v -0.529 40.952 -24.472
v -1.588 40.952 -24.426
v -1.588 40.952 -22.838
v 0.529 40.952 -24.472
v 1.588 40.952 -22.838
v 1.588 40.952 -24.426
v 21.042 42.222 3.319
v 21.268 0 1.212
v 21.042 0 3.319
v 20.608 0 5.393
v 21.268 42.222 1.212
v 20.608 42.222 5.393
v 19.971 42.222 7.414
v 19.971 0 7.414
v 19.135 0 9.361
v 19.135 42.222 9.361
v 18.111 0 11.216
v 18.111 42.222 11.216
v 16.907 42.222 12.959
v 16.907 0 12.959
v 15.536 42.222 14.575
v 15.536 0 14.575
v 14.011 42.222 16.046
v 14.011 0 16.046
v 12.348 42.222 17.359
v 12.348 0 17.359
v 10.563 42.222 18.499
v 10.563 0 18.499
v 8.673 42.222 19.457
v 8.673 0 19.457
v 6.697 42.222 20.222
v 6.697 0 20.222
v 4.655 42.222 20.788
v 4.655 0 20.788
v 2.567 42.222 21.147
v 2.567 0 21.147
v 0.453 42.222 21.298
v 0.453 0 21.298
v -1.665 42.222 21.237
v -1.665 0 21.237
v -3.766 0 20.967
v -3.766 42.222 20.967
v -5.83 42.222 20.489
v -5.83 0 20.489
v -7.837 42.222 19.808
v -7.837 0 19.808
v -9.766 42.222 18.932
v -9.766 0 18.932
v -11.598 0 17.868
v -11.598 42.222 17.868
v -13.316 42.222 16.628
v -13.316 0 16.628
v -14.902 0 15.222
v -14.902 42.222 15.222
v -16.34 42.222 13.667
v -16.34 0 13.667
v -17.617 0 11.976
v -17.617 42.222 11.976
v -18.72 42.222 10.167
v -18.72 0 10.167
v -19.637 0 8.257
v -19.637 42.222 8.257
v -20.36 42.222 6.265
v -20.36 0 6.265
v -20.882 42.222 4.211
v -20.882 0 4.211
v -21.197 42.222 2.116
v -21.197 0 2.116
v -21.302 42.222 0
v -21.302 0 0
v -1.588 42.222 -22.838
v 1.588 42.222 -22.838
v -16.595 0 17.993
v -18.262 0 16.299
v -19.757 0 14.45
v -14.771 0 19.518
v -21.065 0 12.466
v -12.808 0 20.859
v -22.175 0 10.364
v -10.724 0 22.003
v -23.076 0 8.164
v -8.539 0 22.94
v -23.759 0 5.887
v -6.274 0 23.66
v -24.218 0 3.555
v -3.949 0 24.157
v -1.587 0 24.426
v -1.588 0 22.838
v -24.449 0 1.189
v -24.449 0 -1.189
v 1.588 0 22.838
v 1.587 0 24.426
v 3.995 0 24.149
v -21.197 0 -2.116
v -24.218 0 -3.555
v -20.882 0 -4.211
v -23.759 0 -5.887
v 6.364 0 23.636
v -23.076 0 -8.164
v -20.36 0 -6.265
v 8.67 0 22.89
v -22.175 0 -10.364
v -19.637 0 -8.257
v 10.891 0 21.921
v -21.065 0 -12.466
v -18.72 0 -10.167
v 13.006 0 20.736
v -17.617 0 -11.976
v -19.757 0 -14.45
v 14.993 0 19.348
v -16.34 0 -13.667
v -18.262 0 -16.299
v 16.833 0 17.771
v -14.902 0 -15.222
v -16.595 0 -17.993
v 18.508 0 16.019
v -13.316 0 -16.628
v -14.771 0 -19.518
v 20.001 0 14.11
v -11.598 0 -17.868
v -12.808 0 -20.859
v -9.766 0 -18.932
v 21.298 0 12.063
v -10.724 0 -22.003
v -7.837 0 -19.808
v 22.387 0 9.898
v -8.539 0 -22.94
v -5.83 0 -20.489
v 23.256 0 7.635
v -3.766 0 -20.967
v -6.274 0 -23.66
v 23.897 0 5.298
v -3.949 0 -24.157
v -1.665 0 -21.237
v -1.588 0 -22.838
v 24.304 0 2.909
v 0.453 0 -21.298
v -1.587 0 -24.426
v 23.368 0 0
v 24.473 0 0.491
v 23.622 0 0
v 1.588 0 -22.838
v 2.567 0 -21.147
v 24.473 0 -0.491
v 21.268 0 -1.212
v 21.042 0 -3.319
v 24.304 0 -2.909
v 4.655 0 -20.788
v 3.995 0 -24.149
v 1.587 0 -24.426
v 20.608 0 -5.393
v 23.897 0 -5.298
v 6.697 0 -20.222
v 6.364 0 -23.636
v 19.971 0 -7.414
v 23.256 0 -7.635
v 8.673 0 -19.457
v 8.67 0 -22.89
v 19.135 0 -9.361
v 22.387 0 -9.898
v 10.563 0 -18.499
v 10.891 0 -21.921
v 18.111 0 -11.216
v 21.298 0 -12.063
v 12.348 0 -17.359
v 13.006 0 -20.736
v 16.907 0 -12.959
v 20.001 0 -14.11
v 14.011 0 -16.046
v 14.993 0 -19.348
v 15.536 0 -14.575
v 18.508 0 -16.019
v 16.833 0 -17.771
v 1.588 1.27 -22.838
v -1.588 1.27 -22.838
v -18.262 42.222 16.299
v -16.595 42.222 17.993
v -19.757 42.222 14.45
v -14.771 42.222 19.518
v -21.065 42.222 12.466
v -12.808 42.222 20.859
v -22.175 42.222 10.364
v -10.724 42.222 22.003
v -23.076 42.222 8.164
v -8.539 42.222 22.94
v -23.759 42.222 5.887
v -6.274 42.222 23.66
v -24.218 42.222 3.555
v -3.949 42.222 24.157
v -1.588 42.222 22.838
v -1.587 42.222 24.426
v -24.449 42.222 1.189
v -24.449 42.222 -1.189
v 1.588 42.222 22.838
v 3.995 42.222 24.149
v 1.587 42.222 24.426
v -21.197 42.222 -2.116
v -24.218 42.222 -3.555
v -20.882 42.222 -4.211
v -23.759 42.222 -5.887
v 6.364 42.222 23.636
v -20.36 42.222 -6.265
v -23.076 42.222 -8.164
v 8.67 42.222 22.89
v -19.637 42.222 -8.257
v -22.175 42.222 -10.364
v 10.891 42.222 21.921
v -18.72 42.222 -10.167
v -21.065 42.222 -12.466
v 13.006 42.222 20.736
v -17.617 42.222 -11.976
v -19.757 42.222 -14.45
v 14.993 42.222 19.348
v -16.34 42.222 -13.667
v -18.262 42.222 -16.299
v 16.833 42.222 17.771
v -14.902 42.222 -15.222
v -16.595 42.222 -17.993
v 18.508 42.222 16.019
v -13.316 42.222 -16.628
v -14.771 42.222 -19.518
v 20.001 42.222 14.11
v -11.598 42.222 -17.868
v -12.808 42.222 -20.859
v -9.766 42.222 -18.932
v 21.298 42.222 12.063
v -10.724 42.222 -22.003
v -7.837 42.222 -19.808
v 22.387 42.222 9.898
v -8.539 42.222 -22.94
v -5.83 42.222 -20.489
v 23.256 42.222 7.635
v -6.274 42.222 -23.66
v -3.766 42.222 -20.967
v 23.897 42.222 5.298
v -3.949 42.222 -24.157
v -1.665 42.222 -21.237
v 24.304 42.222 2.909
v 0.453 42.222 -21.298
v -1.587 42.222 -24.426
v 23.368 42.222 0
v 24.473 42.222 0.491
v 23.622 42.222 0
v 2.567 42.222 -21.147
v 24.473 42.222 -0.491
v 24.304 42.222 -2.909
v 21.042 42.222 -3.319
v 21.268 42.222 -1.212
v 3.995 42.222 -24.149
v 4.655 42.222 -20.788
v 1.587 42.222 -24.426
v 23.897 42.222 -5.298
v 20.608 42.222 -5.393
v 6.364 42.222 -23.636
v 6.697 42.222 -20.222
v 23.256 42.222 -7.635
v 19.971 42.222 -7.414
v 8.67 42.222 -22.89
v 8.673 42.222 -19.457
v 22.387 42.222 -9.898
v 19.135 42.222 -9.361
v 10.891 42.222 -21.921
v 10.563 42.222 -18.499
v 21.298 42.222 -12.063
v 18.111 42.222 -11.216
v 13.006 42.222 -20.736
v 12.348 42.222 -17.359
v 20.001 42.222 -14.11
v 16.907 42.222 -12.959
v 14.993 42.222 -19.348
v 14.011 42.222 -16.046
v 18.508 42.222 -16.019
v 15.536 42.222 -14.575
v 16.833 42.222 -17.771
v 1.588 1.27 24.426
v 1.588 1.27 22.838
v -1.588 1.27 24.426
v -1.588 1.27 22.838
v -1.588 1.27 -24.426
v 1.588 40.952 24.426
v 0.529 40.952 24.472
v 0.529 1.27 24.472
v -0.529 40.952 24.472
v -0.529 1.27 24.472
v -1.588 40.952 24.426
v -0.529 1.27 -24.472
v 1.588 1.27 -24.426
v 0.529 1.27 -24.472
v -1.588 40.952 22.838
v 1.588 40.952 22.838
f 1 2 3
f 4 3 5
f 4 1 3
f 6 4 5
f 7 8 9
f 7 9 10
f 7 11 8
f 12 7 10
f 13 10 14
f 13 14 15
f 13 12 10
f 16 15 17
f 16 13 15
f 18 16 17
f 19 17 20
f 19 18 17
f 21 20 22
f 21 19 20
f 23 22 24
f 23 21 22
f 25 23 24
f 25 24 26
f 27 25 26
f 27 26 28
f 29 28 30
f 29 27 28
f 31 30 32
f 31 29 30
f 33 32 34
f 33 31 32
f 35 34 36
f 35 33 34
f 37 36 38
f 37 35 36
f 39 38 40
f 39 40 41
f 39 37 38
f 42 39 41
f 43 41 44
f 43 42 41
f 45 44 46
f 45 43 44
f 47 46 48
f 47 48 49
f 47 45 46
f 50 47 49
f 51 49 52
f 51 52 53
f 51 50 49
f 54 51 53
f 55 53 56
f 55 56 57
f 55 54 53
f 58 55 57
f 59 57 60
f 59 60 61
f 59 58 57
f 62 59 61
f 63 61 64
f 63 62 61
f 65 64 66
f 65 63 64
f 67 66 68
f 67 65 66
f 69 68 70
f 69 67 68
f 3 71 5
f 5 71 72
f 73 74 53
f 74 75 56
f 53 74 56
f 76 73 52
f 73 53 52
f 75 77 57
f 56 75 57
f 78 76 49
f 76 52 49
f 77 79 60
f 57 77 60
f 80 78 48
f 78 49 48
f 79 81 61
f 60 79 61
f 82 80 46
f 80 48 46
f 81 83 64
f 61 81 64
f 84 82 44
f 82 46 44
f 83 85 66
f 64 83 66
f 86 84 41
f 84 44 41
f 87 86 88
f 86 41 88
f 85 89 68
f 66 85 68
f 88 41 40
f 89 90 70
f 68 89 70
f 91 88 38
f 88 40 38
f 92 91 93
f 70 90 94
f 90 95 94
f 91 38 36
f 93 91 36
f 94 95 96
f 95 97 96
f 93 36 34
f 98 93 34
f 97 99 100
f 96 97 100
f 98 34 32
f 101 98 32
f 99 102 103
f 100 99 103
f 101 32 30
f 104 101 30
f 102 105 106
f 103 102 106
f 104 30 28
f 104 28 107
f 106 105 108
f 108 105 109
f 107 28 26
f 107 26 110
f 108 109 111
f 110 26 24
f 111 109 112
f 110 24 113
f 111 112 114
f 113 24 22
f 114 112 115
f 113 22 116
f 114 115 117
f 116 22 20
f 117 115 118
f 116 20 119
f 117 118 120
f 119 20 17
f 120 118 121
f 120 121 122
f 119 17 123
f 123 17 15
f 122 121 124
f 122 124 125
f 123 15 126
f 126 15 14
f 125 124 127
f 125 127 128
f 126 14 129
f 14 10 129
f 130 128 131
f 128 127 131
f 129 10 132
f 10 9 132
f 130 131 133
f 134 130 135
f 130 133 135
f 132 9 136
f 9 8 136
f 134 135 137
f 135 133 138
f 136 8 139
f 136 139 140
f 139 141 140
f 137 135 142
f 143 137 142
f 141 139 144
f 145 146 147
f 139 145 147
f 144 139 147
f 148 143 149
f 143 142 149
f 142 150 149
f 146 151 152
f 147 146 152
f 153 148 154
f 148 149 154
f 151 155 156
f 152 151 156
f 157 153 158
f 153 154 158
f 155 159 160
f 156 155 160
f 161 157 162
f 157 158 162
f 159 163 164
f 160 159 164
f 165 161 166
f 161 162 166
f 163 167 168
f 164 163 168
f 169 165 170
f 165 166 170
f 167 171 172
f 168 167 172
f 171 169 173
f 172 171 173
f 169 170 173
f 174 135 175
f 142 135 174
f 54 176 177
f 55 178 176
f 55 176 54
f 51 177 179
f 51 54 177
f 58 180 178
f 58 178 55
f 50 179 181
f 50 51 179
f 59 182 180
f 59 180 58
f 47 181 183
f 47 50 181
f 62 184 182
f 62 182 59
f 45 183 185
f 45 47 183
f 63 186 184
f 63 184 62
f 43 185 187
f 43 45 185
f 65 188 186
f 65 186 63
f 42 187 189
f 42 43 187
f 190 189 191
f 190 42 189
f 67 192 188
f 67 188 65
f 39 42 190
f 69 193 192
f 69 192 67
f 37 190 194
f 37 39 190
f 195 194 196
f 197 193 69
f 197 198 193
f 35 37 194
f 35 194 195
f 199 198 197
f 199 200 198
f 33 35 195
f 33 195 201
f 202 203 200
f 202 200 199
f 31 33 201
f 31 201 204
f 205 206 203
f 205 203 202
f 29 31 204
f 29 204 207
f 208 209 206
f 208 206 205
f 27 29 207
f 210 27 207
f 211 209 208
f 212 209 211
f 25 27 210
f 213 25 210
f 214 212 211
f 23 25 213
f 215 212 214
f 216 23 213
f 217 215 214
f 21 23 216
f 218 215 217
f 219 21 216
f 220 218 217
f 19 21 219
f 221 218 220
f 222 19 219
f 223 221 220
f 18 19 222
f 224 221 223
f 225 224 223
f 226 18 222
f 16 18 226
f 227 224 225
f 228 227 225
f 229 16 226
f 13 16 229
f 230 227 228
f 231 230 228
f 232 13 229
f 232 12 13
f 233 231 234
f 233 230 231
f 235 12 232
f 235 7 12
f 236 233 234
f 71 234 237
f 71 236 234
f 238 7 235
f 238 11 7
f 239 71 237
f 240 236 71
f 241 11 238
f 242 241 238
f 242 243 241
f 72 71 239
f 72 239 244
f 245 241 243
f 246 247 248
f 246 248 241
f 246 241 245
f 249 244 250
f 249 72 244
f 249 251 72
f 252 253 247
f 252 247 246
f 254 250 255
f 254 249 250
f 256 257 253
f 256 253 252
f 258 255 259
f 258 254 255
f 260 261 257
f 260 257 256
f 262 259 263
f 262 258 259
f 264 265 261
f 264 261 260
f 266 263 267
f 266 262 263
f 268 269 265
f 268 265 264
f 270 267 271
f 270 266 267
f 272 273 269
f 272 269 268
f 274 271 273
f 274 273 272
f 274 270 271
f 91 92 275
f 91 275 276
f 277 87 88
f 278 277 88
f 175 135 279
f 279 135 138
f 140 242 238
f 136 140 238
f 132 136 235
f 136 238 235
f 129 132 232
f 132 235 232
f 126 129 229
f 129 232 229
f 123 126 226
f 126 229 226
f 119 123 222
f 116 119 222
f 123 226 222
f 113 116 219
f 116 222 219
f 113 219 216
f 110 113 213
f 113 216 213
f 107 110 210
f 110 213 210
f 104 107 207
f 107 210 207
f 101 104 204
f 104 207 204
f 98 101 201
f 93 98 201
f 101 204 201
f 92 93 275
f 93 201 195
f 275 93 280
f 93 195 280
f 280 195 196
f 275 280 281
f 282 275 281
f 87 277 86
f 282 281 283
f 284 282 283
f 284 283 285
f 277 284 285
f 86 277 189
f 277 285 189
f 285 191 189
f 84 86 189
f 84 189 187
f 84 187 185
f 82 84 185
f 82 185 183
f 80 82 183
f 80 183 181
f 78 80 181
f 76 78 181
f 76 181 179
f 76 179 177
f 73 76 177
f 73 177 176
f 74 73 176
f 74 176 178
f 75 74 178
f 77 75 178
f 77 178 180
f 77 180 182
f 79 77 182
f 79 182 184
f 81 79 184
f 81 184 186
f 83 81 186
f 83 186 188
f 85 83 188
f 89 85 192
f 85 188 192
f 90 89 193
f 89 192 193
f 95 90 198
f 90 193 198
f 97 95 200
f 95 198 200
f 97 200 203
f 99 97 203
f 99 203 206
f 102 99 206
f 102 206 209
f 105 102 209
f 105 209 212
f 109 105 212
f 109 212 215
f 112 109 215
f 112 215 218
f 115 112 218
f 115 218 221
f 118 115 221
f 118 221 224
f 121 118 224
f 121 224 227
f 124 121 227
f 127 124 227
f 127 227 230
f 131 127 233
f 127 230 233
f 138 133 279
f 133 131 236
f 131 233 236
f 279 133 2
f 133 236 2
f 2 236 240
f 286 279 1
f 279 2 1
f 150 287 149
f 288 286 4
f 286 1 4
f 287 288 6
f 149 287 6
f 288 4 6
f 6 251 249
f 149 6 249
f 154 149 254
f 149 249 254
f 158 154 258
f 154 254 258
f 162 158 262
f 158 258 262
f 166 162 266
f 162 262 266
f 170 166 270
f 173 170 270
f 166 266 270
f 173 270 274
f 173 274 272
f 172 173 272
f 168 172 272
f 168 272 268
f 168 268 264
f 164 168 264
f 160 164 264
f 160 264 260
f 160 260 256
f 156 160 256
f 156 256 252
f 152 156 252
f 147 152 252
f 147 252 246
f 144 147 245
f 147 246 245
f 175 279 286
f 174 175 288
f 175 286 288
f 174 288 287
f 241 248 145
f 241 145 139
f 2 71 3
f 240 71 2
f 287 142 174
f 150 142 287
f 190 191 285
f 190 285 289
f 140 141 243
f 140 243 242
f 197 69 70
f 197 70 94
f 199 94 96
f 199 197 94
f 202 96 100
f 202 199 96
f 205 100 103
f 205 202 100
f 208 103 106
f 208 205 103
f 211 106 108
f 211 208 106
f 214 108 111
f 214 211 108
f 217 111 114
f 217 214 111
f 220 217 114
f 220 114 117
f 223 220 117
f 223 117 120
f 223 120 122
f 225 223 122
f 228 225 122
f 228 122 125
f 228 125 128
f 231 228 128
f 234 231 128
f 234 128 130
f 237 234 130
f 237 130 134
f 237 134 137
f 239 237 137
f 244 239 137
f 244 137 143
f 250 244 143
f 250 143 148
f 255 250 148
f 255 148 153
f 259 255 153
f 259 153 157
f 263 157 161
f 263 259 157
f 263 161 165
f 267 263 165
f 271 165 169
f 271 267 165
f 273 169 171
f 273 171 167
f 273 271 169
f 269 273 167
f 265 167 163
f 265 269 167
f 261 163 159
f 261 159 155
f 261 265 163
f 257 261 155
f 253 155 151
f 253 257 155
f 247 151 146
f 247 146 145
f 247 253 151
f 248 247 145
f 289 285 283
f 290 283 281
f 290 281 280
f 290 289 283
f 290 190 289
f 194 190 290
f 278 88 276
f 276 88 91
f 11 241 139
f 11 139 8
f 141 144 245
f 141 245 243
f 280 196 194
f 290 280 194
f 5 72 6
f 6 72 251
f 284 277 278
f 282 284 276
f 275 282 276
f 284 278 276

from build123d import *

# Parameters (mm, degrees)
SKETCH2_W               = 3.175
SKETCH2_H               = 42.221697185
SKETCH3_W               = 3.175
SKETCH3_H               = 3.175
CUT_EXTRUDE1_DEPTH      = 1.27
CUT_EXTRUDE2_DEPTH      = 41.54574875
CUT_EXTRUDE2_DEPTH_BACK = 41.54574875


with BuildPart() as part:
    # Sketch2 → Revolve1 (revolve)
    with BuildSketch(Plane.XY, mode=Mode.PRIVATE) as revolve1_sk:
        with Locations((22.889936685, 21.110848593)):
            Rectangle(SKETCH2_W, SKETCH2_H)
    revolve(revolve1_sk.sketch.rotate(Axis((0, 38.094197185, 0), (0, -1, 0)), 180), axis=Axis((0, 38.094197185, 0), (0, -1, 0)))

    # Sketch3 → Cut-Extrude1 (cut)
    with BuildSketch(Plane(origin=(0, 42.221697185, 0), x_dir=(1, 0, 0), z_dir=(0, 1, 0))):
        with Locations((0, 24.425903267)):
            Rectangle(SKETCH3_W, SKETCH3_H)
        with Locations((0, -24.425903267)):
            Rectangle(SKETCH3_W, SKETCH3_H)
    cut_extrude1 = extrude(amount=-CUT_EXTRUDE1_DEPTH, mode=Mode.SUBTRACT)

    # Mirror1: Cut-Extrude1 across plane
    add(cut_extrude1.mirror(Plane.ZX.offset(21.110848593)), mode=Mode.SUBTRACT)

    # Sketch4 → Cut-Extrude2 (cut, two sides: drawn at the far end of the back side and taken through both)
    with BuildSketch(Plane(origin=(0, 21.110848593, 0), x_dir=(1, 0, 0), z_dir=(0, 1, 0)).offset(-CUT_EXTRUDE2_DEPTH_BACK)):
        with BuildLine():
            Line((24.472510779, 0.491042627), (23.622, 0))
            Line((23.622, 0), (24.472510779, -0.491042627))
            ThreePointArc((24.472510779, -0.491042627), (24.477436685, 0), (24.472510779, 0.491042627))
        make_face()
        with BuildLine():
            Line((21.26790239, 1.21249192), (23.368, 0))
            Line((23.368, 0), (21.26790239, -1.21249192))
            ThreePointArc((21.26790239, -1.21249192), (21.302436685, 0), (21.26790239, 1.21249192))
        make_face()
    extrude(amount=CUT_EXTRUDE2_DEPTH + CUT_EXTRUDE2_DEPTH_BACK, mode=Mode.SUBTRACT)


solid = part.part
